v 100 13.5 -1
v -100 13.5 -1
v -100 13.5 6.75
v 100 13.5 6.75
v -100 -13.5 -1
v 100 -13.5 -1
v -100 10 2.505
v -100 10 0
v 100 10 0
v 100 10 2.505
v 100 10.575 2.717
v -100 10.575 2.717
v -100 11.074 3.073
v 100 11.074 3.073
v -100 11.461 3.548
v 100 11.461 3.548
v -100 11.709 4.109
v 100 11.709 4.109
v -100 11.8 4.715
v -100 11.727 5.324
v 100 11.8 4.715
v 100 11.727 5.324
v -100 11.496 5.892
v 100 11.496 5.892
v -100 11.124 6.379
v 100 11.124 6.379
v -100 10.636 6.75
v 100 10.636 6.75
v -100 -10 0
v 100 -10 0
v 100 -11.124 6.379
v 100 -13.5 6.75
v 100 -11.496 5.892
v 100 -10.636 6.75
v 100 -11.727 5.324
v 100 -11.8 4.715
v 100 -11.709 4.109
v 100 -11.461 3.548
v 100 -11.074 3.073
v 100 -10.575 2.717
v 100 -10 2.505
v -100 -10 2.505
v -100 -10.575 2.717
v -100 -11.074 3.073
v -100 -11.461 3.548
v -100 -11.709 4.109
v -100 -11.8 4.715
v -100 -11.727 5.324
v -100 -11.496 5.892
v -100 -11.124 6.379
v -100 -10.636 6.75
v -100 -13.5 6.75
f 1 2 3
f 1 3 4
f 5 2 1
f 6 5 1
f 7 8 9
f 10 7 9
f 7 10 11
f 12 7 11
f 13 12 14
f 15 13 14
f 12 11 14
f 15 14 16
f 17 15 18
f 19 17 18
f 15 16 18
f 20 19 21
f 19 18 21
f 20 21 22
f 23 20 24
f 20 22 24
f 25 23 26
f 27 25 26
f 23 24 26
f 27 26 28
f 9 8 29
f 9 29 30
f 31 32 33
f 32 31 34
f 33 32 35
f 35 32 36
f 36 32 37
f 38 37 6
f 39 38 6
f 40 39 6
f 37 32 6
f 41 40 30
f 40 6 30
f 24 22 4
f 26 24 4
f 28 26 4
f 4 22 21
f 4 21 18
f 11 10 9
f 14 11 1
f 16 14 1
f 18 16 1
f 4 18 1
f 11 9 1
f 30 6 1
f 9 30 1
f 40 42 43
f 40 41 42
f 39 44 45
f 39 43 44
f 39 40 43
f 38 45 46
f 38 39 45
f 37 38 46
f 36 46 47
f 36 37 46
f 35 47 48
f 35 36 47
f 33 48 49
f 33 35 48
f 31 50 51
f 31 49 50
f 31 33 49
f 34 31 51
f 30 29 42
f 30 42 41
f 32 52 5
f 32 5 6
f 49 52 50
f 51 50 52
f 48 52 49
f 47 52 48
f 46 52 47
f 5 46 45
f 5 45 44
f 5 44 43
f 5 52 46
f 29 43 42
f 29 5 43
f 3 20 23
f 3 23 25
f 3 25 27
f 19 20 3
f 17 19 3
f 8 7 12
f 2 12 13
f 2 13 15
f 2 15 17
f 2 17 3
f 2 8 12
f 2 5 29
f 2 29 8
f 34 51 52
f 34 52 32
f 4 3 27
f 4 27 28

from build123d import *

# Parameters (mm, degrees)
SKETCH1_W           = 200
SKETCH1_H           = 27
BOSS_EXTRUDE1_DEPTH = 1
SKETCH2_W           = 200
SKETCH2_H           = 3.5
BOSS_EXTRUDE2_DEPTH = 6.75
SKETCH3_R           = 2.3
TOP_SLOT_DEPTH      = 102.132648042


with BuildPart() as part:
    # Sketch1 → Boss-Extrude1 (new body)
    with BuildSketch(Plane.XY):
        Rectangle(SKETCH1_W, SKETCH1_H)
    extrude(amount=-BOSS_EXTRUDE1_DEPTH)

    # Sketch2 → Boss-Extrude2 (add)
    with BuildSketch(Plane.XY):
        with Locations((0, 11.75)):
            Rectangle(SKETCH2_W, SKETCH2_H)
        with Locations((0, -11.75)):
            Rectangle(SKETCH2_W, SKETCH2_H)
    extrude(amount=BOSS_EXTRUDE2_DEPTH)

    # Sketch3 → Top Slot (cut, symmetric)
    with BuildSketch(Plane(origin=(0, 0, 0), x_dir=(0, 0, -1), z_dir=(1, 0, 0))):
        with Locations((-4.75, 9.5)):
            Circle(SKETCH3_R)
    top_slot = extrude(amount=TOP_SLOT_DEPTH, both=True, mode=Mode.SUBTRACT)

    # Bottom Slot: Top Slot across plane
    add(top_slot.mirror(Plane.ZX), mode=Mode.SUBTRACT)


solid = part.part
